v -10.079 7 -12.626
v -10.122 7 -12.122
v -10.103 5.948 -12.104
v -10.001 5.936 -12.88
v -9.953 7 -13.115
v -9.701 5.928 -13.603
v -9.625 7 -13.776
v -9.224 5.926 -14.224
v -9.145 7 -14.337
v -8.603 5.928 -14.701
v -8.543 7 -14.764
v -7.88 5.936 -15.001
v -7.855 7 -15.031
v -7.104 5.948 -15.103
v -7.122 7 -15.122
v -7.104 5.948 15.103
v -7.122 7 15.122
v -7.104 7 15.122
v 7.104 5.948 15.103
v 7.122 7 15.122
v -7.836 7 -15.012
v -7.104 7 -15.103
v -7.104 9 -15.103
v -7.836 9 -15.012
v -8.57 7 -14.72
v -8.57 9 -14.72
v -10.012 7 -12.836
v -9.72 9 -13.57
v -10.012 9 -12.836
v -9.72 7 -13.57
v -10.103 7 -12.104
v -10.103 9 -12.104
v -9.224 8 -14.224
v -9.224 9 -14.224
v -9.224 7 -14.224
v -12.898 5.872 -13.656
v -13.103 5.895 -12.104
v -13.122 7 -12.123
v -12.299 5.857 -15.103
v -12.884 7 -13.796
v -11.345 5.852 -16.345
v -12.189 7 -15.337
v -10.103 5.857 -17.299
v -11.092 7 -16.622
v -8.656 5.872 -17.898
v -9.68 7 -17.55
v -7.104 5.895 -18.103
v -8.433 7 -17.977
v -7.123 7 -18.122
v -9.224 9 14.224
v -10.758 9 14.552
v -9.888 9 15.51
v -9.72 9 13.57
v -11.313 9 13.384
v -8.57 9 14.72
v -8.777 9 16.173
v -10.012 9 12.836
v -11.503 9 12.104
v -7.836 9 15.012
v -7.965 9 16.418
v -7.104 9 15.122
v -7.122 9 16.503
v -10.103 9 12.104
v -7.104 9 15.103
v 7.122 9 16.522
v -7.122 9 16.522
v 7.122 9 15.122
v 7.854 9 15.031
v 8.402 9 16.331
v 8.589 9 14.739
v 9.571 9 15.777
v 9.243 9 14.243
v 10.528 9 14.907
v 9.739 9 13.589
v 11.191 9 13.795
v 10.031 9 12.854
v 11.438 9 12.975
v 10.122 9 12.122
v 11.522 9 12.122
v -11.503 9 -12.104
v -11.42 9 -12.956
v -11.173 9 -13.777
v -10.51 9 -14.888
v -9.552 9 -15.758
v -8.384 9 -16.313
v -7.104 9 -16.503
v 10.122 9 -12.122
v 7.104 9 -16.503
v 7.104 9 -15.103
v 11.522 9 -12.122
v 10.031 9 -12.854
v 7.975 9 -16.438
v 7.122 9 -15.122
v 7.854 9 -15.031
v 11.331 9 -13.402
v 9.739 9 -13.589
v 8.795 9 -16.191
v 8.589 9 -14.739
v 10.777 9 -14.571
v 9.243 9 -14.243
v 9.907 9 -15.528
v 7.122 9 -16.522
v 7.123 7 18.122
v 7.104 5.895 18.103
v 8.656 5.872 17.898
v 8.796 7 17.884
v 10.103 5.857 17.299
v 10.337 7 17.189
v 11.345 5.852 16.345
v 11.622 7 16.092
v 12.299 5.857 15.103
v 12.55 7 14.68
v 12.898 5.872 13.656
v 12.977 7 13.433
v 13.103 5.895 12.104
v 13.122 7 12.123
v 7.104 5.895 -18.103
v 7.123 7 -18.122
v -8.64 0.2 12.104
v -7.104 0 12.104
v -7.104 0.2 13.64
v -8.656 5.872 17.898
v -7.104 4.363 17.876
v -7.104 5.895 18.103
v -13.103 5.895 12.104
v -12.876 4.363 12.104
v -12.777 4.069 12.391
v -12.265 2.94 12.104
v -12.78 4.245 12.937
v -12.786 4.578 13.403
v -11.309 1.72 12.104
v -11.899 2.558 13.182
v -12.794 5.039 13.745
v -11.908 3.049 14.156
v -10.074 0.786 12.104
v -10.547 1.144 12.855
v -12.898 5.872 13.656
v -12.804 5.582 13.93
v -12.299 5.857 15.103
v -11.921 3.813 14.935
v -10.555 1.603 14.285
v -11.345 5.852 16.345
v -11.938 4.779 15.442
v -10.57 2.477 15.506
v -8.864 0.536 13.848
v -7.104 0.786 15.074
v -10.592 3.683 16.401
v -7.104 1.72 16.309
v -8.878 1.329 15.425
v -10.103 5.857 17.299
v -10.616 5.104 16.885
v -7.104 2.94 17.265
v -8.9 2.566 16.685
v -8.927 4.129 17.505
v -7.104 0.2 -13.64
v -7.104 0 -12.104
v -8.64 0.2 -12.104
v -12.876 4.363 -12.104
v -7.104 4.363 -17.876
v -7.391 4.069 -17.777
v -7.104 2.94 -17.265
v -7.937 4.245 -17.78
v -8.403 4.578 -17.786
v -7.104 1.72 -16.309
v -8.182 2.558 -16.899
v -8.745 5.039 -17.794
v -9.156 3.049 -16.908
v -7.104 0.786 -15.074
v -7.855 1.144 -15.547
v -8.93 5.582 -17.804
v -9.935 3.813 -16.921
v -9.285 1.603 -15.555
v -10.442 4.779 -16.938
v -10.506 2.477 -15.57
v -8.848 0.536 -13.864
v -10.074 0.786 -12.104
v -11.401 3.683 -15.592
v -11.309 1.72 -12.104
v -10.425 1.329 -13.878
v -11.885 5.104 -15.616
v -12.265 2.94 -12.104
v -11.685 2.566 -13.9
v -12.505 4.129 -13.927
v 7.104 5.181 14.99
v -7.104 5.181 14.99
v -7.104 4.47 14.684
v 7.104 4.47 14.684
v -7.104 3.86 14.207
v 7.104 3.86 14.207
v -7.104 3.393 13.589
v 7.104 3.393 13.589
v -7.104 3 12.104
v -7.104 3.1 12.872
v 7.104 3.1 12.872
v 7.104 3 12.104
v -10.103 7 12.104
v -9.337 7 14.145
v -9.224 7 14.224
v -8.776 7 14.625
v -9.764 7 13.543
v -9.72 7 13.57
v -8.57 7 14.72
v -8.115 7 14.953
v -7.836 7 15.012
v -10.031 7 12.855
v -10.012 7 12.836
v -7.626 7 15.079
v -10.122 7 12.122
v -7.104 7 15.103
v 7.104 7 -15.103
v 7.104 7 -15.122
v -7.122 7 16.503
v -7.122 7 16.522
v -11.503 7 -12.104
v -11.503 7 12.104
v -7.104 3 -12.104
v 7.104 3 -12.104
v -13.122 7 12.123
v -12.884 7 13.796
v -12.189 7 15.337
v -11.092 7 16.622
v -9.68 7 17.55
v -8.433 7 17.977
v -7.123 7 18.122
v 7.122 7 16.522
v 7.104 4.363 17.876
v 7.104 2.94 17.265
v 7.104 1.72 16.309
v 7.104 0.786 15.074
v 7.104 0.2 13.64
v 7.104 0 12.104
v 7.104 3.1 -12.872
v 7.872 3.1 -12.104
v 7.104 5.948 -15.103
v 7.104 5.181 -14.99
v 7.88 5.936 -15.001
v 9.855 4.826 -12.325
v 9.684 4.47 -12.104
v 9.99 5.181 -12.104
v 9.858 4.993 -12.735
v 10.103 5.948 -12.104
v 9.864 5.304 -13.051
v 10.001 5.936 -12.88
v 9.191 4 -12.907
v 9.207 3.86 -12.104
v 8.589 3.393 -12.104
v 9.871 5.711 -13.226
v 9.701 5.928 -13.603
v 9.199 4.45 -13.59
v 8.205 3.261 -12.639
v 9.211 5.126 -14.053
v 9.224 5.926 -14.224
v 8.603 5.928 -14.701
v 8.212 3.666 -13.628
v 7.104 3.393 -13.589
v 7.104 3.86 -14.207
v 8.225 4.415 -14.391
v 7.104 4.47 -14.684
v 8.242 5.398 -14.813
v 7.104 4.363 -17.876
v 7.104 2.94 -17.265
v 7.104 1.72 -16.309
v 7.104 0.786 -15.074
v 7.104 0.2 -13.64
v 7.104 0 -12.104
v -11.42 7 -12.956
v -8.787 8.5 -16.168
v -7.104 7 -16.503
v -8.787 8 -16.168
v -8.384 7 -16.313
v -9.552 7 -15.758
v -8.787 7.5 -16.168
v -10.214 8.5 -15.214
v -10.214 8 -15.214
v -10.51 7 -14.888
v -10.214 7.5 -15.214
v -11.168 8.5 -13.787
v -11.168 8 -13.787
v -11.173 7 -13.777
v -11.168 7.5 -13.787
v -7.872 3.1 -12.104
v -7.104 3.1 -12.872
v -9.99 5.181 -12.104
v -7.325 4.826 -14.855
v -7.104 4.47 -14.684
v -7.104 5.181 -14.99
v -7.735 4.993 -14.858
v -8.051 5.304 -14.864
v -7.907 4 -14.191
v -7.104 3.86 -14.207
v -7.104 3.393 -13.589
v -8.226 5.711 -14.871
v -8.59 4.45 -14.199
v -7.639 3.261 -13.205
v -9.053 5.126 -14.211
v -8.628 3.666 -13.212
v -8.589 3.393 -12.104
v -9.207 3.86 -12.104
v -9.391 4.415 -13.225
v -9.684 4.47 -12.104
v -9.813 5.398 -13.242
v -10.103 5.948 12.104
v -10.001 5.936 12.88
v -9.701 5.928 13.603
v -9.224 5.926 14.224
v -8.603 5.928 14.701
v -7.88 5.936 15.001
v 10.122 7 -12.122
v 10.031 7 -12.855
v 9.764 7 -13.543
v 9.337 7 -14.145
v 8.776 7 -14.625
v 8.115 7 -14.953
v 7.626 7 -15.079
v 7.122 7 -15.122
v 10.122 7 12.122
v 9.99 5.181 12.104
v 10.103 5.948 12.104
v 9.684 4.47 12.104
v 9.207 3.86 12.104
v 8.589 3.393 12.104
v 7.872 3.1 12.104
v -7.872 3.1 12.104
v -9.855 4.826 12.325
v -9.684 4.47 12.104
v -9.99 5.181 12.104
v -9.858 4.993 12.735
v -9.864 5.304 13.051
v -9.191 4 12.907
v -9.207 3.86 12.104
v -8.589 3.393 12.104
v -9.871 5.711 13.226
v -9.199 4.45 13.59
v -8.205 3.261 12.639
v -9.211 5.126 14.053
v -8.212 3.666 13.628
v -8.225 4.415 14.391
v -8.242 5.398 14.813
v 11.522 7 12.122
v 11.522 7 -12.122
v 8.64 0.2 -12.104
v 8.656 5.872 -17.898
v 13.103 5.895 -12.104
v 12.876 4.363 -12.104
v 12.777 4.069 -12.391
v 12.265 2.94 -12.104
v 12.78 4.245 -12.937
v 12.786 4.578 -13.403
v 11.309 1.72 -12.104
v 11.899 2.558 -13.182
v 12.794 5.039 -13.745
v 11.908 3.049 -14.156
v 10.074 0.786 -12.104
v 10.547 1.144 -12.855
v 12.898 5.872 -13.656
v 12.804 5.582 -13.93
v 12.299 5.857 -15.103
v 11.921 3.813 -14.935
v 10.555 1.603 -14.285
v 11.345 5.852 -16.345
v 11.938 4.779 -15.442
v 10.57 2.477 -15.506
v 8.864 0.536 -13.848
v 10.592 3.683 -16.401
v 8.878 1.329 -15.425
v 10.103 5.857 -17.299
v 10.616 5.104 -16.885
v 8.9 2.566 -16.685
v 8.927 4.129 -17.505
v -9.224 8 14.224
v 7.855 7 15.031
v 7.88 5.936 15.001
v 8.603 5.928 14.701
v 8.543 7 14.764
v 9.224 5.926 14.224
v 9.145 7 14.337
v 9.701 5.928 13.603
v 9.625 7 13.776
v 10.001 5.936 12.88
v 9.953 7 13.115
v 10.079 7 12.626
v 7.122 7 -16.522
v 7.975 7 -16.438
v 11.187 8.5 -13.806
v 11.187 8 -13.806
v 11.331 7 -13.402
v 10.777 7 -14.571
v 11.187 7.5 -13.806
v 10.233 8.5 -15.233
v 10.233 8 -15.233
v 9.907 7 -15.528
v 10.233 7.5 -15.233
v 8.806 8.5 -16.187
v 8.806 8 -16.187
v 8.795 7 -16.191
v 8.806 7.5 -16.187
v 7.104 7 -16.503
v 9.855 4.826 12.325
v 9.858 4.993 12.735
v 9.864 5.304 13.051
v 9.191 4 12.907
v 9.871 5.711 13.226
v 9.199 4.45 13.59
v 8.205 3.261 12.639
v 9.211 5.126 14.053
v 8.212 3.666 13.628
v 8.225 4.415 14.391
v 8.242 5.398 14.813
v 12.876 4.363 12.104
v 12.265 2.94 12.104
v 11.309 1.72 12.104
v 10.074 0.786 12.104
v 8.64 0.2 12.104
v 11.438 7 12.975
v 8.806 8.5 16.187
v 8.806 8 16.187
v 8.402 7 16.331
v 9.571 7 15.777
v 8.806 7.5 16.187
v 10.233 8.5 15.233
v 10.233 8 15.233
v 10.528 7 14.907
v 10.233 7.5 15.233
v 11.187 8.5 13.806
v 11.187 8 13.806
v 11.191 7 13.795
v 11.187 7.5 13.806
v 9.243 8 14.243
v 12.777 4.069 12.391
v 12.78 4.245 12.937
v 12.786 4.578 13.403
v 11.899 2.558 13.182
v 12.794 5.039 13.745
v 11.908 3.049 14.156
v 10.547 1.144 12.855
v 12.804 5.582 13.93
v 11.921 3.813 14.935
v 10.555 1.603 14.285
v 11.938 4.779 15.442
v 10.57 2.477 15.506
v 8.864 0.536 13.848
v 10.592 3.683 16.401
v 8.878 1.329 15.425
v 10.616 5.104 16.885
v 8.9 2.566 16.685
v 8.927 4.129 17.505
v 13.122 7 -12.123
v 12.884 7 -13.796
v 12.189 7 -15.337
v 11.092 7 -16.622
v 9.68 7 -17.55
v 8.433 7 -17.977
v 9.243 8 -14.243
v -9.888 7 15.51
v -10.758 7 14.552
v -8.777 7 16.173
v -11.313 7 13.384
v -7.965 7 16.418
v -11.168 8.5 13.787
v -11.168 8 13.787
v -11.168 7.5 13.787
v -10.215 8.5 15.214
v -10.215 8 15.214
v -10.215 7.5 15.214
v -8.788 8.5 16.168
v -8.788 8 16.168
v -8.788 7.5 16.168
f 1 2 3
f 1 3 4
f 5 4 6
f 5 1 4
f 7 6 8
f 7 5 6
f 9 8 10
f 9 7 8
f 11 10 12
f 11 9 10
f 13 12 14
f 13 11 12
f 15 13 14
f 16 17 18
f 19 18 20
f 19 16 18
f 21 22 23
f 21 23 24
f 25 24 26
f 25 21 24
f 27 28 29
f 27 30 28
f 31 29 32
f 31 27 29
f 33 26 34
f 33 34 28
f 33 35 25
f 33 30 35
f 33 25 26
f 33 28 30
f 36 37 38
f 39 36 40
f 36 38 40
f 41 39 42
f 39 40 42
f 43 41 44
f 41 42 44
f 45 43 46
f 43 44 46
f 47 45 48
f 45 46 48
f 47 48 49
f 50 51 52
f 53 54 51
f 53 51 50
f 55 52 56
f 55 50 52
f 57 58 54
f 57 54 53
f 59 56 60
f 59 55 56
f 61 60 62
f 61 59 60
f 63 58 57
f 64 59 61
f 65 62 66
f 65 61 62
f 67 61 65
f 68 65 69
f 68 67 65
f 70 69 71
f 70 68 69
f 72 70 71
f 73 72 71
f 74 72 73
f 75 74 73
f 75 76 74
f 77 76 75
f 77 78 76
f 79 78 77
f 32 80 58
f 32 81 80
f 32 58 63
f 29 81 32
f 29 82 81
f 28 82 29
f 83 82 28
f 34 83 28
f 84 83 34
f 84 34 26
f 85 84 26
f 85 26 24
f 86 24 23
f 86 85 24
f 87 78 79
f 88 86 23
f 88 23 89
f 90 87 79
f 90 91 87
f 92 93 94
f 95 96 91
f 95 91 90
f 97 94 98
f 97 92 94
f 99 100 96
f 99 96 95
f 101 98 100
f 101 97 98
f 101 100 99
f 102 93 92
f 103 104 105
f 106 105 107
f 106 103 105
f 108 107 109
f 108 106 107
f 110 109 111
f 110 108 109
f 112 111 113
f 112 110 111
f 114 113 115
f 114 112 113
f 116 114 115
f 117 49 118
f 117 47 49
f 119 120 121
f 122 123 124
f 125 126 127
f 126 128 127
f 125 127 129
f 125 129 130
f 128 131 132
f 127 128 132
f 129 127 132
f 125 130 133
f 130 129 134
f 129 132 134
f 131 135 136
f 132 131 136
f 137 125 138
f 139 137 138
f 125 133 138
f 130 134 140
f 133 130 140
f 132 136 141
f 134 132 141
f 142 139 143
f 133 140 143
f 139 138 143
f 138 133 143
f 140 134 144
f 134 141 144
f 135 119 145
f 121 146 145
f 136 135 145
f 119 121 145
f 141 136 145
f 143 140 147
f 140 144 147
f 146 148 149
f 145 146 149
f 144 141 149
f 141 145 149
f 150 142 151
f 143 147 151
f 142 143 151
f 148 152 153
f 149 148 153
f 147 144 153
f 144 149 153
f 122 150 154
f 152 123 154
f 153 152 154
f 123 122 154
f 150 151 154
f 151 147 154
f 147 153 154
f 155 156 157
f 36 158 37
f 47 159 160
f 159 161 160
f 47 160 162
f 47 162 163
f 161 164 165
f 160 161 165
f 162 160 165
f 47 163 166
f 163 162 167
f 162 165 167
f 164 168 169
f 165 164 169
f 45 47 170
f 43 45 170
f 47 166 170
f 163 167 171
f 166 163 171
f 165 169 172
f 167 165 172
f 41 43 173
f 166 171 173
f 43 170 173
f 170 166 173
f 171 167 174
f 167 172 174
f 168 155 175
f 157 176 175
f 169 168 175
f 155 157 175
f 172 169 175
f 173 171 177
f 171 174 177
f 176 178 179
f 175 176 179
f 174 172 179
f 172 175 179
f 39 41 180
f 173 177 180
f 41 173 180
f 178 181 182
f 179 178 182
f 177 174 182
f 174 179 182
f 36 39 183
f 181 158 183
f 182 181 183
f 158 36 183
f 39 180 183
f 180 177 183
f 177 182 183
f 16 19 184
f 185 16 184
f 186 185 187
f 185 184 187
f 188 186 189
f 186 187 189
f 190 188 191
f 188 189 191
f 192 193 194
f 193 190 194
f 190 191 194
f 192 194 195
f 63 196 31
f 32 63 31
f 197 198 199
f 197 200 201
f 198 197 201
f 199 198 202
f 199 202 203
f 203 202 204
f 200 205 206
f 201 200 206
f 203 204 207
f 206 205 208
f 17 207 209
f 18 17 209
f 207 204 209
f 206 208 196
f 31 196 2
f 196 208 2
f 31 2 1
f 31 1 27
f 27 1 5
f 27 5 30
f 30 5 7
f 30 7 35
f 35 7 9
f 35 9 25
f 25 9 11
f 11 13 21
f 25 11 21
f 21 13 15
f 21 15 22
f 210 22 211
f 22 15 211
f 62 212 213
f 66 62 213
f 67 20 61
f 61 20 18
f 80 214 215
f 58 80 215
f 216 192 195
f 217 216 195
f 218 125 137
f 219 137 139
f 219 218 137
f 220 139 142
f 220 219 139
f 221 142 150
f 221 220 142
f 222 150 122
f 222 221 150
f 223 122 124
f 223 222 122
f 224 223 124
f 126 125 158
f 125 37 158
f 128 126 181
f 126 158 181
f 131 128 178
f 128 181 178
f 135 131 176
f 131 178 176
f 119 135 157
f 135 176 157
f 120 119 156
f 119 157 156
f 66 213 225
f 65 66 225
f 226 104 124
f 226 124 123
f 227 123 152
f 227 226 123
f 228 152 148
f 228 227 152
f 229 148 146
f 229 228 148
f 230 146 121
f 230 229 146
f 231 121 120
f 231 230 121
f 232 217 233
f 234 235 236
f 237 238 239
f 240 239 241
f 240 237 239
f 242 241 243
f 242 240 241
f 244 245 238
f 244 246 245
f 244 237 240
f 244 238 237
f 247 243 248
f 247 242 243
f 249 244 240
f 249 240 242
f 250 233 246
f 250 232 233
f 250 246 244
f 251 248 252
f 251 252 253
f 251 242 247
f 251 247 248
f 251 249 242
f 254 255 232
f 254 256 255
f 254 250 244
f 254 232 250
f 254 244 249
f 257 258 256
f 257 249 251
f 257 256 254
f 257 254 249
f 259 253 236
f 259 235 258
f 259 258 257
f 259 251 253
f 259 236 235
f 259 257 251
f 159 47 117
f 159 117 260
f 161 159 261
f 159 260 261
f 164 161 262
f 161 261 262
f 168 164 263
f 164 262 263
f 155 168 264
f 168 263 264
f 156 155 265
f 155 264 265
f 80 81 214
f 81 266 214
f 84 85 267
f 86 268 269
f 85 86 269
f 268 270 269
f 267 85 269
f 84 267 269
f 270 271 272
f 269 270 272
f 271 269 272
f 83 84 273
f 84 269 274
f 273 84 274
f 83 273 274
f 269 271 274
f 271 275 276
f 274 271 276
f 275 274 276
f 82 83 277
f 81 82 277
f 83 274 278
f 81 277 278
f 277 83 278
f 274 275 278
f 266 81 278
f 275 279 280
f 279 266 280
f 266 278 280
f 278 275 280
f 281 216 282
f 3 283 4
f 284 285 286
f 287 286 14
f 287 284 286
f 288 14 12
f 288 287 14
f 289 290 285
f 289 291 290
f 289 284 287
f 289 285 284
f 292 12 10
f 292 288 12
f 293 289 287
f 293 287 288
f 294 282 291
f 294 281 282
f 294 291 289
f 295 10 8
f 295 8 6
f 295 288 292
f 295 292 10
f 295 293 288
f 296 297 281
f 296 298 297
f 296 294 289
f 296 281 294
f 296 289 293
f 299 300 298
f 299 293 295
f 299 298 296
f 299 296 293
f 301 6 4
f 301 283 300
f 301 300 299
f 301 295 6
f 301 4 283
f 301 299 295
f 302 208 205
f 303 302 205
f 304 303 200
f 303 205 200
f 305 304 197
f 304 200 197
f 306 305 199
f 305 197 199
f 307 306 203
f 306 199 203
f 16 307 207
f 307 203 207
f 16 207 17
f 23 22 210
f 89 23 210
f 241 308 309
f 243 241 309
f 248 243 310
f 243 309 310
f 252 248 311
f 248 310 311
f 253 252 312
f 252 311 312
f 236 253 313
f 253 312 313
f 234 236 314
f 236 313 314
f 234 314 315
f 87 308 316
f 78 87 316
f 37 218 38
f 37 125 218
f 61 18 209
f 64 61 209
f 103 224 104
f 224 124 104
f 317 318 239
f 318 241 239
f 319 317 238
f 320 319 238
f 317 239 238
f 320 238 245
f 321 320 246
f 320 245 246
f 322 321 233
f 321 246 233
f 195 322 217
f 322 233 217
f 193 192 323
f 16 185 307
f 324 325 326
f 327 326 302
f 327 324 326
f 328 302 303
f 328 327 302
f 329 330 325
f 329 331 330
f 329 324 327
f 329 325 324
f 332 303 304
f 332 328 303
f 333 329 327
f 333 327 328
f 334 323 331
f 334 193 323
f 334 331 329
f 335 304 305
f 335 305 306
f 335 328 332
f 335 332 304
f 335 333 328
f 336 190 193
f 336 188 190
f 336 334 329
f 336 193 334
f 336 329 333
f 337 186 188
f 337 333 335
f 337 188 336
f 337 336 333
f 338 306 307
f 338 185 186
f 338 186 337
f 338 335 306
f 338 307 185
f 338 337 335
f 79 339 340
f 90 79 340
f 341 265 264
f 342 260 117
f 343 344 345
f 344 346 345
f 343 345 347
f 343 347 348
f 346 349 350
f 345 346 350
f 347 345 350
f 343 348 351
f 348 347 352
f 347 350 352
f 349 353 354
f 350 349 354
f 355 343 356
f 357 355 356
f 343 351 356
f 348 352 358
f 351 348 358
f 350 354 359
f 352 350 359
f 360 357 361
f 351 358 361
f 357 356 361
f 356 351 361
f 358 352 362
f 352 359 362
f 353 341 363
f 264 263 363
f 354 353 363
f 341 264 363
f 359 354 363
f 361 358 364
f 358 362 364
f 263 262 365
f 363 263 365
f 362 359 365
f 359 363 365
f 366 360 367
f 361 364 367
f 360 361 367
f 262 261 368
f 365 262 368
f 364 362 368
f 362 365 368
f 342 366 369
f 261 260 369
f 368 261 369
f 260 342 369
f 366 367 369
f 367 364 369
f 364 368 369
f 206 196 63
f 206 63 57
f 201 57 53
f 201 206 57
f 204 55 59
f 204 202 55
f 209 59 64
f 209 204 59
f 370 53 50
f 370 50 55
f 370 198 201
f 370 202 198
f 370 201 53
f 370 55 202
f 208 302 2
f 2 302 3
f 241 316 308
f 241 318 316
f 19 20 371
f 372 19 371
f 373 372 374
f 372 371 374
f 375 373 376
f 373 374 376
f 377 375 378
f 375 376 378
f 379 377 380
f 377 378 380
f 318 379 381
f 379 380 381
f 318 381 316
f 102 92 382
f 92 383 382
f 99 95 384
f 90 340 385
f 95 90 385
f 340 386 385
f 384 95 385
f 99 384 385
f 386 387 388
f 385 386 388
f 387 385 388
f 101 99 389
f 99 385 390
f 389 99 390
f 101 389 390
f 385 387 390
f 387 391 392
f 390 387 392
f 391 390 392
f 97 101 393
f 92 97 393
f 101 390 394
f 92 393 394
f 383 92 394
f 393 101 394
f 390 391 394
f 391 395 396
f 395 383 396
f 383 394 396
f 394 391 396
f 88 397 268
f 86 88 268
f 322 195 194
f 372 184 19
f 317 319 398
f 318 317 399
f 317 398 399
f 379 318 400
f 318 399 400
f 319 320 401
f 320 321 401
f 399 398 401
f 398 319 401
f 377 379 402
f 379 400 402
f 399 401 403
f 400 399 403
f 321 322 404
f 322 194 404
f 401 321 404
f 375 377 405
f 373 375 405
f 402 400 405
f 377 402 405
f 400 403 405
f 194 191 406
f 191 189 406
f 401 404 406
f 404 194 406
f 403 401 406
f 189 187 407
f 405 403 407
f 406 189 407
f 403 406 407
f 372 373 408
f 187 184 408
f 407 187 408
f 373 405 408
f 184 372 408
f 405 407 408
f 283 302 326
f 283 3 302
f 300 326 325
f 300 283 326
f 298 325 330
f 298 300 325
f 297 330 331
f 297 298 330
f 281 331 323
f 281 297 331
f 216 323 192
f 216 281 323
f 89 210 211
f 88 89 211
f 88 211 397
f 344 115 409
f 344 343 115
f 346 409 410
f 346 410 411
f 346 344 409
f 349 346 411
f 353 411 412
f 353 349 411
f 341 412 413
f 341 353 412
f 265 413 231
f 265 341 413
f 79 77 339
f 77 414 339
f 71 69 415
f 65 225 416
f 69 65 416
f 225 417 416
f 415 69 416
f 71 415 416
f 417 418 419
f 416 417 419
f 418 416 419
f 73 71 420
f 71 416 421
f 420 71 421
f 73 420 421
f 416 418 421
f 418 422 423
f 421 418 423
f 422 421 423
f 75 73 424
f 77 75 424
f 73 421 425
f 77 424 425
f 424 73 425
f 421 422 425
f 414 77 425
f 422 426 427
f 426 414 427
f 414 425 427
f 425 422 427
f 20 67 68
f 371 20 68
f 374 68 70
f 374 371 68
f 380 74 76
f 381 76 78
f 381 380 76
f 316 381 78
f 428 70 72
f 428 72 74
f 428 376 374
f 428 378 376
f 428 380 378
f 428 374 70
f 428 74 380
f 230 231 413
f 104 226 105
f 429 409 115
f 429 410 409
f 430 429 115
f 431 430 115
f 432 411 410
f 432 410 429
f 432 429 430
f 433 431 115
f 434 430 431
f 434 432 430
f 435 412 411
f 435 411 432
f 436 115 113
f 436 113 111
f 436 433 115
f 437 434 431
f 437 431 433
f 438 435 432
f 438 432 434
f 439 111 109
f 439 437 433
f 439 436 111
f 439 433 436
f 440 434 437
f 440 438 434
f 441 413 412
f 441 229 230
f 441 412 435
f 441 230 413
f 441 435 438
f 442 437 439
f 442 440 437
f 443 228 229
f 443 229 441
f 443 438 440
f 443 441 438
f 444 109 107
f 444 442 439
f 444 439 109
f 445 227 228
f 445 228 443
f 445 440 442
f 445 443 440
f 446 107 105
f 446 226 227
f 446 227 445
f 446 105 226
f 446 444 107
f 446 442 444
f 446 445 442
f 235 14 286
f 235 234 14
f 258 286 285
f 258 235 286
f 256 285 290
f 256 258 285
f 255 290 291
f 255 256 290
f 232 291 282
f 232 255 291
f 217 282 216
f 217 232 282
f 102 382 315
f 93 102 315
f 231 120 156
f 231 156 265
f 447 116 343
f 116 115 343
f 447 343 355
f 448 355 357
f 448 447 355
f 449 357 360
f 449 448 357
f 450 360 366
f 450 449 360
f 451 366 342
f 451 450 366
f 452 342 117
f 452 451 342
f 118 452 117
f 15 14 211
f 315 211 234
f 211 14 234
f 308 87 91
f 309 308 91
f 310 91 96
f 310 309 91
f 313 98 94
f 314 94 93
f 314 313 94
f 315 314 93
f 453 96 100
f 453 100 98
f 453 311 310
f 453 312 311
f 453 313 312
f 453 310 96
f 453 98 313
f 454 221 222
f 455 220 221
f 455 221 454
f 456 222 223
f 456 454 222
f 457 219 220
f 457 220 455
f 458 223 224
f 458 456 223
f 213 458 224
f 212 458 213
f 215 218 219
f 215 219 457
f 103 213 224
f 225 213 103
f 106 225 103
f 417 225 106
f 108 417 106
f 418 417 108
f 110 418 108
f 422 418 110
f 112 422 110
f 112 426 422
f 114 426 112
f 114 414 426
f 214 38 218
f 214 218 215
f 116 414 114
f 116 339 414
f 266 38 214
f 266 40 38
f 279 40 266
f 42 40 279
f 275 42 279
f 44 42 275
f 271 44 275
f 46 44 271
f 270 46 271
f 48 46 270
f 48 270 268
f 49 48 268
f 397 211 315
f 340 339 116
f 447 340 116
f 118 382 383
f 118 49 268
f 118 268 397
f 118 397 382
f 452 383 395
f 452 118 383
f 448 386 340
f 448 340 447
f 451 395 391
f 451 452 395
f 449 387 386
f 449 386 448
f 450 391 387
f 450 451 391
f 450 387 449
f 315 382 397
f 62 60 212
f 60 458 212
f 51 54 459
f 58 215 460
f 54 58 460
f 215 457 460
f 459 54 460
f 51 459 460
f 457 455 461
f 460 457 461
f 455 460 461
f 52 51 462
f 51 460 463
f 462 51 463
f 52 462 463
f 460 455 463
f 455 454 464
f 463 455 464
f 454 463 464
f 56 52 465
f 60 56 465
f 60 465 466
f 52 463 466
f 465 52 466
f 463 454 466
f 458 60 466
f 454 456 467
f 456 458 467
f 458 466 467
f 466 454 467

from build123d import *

# Parameters (mm, degrees)
SKETCH1_W           = 26
SKETCH1_H           = 36
BOSS_EXTRUDE1_DEPTH = 7
BOSS_EXTRUDE1_DRAFT = -1
FILLET1_R           = 6
SHELL1_T            = -3
EXTRUDE_THIN1_DEPTH = 2


# Read off the part's stored shape, not the designer's step: Extrude-Thin1
with BuildPart() as part:
    # Sketch1 → Boss-Extrude1 (with draft: the straight prism first)
    with BuildSketch(Plane(origin=(0, 0, 0), x_dir=(1, 0, 0), z_dir=(0, 1, 0))):
        Rectangle(SKETCH1_W, SKETCH1_H)
    extrude(amount=BOSS_EXTRUDE1_DEPTH)
    # Boss-Extrude1: the draft: its side faces are tilted about the plane it starts from
    boss_extrude1_sides = [part.faces().sort_by_distance(p)[0] for p in [
        (-13, 3.5, 0),
        (0, 3.5, 18),
        (13, 3.5, 0),
        (0, 3.5, -18),
    ]]
    draft(boss_extrude1_sides, Plane(origin=(0, 0, 0), x_dir=(1, 0, 0), z_dir=(0, 1, 0)), BOSS_EXTRUDE1_DRAFT)

    # Fillet1
    fillet1_edges = [part.edges().sort_by_distance(p)[0] for p in [
        (0, 0, 18),
        (-13, 0, 0),
        (0, 0, -18),
        (13, 0, 0),
        (13.061092727, 3.5, 18.061092727),
        (-13.061092727, 3.5, 18.061092727),
        (-13.061092727, 3.5, -18.061092727),
        (13.061092727, 3.5, -18.061092727),
    ]]
    fillet(fillet1_edges, radius=FILLET1_R)

    # Shell1
    shell1_openings = [part.faces().sort_by_distance(p)[0] for p in [
        (0, 7, 0),
    ]]
    offset(amount=SHELL1_T, openings=shell1_openings, kind=Kind.INTERSECTION)

    # Extrude-Thin1 outline → Extrude-Thin1 (add)
    with BuildSketch(Plane(origin=(0, 7, 0), x_dir=(1, 0, 0), z_dir=(0, 1, 0))):
        with BuildLine():
            Line((-11.503359551, 12.103816421), (-11.503359551, -12.103816421))
            add(Edge.make_bspline(
                [(-11.503359551, -12.103816421), (-11.503239974, -12.679639127), (-11.388644012, -13.255211042), (-10.94780799, -14.319148914), (-10.621742234, -14.807098768), (-9.807439748, -15.62148016), (-9.319521491, -15.947593193), (-8.261151516, -16.386242364), (-7.692017173, -16.500790934), (-7.122185385, -16.503316936)],
                knots=[0, 0, 0, 0, 0.25, 0.25, 0.5, 0.5, 0.75, 0.75, 0.997403327, 0.997403327, 0.997403327, 0.997403327], degree=3))
            Line((-7.122185385, -16.503316936), (-7.122185385, -16.52172847))
            Line((-7.122185385, -16.52172847), (7.122185385, -16.52172847))
            add(Edge.make_bspline(
                [(7.122185385, -16.52172847), (7.698092154, -16.52172847), (8.273773075, -16.407240069), (9.337918721, -15.966495827), (9.825962781, -15.640412314), (10.640412314, -14.825962781), (10.966495827, -14.337918721), (11.407240069, -13.273773075), (11.52172847, -12.698092154), (11.52172847, -12.122185385)],
                knots=[0, 0, 0, 0, 0.25, 0.25, 0.5, 0.5, 0.75, 0.75, 1, 1, 1, 1], degree=3))
            Line((11.52172847, -12.122185385), (11.52172847, 12.122185385))
            add(Edge.make_bspline(
                [(11.52172847, 12.122185385), (11.52172847, 12.698092154), (11.407240069, 13.273773075), (10.966495827, 14.337918721), (10.640412314, 14.825962781), (9.825962781, 15.640412314), (9.337918721, 15.966495827), (8.273773075, 16.407240069), (7.698092154, 16.52172847), (7.122185385, 16.52172847)],
                knots=[0, 0, 0, 0, 0.25, 0.25, 0.5, 0.5, 0.75, 0.75, 1, 1, 1, 1], degree=3))
            Line((7.122185385, 16.52172847), (7.122185385, 15.12172847))
            add(Edge.make_bspline(
                [(10.12172847, 12.122185385), (10.12172847, 15.12172847), (7.122185385, 15.12172847)],
                knots=[2.356346783, 2.356346783, 2.356346783, 3.926838524, 3.926838524, 3.926838524], degree=2, weights=[1, 0.707214461, 1]))
            Line((10.12172847, 12.122185385), (10.12172847, -12.122185385))
            add(Edge.make_bspline(
                [(7.122185385, -15.12172847), (10.12172847, -15.12172847), (10.12172847, -12.122185385)],
                knots=[2.356346783, 2.356346783, 2.356346783, 3.926838524, 3.926838524, 3.926838524], degree=2, weights=[1, 0.707214461, 1]))
            Line((7.122185385, -15.12172847), (-7.103822016, -15.12172847))
            Line((-7.103822016, -15.12172847), (-7.103816421, -15.103359507))
            add(Edge.make_bspline(
                [(-10.103359507, -12.103816421), (-10.102446165, -15.102446165), (-7.103816421, -15.103359507)],
                knots=[3.92714311, 3.92714311, 3.92714311, 5.497634851, 5.497634851, 5.497634851], degree=2, weights=[1, 0.707214461, 1]))
            Line((-10.103359507, -12.103816421), (-10.103359507, 12.103816421))
            add(Edge.make_bspline(
                [(-7.103816421, 15.103359507), (-10.102446165, 15.102446165), (-10.103359507, 12.103816421)],
                knots=[3.92714311, 3.92714311, 3.92714311, 5.497634851, 5.497634851, 5.497634851], degree=2, weights=[1, 0.707214461, 1]))
            Line((-7.103816421, 15.103359507), (7.103816421, 15.103359507))
            Line((7.103816421, 15.103359507), (7.103816421, 16.503359507))
            Line((7.103816421, 16.503359507), (-7.103816421, 16.503359551))
            add(Edge.make_bspline(
                [(-7.103816421, 16.503359551), (-7.679674662, 16.503239967), (-8.255282039, 16.388629695), (-9.319274889, 15.947740691), (-9.807244134, 15.621636328), (-10.621636328, 14.807244134), (-10.947740691, 14.319274889), (-11.388629695, 13.255282039), (-11.503239967, 12.679674662), (-11.503359551, 12.103816421)],
                knots=[0, 0, 0, 0, 0.25, 0.25, 0.5, 0.5, 0.75, 0.75, 1, 1, 1, 1], degree=3))
        make_face()
    extrude(amount=EXTRUDE_THIN1_DEPTH)


solid = part.part
